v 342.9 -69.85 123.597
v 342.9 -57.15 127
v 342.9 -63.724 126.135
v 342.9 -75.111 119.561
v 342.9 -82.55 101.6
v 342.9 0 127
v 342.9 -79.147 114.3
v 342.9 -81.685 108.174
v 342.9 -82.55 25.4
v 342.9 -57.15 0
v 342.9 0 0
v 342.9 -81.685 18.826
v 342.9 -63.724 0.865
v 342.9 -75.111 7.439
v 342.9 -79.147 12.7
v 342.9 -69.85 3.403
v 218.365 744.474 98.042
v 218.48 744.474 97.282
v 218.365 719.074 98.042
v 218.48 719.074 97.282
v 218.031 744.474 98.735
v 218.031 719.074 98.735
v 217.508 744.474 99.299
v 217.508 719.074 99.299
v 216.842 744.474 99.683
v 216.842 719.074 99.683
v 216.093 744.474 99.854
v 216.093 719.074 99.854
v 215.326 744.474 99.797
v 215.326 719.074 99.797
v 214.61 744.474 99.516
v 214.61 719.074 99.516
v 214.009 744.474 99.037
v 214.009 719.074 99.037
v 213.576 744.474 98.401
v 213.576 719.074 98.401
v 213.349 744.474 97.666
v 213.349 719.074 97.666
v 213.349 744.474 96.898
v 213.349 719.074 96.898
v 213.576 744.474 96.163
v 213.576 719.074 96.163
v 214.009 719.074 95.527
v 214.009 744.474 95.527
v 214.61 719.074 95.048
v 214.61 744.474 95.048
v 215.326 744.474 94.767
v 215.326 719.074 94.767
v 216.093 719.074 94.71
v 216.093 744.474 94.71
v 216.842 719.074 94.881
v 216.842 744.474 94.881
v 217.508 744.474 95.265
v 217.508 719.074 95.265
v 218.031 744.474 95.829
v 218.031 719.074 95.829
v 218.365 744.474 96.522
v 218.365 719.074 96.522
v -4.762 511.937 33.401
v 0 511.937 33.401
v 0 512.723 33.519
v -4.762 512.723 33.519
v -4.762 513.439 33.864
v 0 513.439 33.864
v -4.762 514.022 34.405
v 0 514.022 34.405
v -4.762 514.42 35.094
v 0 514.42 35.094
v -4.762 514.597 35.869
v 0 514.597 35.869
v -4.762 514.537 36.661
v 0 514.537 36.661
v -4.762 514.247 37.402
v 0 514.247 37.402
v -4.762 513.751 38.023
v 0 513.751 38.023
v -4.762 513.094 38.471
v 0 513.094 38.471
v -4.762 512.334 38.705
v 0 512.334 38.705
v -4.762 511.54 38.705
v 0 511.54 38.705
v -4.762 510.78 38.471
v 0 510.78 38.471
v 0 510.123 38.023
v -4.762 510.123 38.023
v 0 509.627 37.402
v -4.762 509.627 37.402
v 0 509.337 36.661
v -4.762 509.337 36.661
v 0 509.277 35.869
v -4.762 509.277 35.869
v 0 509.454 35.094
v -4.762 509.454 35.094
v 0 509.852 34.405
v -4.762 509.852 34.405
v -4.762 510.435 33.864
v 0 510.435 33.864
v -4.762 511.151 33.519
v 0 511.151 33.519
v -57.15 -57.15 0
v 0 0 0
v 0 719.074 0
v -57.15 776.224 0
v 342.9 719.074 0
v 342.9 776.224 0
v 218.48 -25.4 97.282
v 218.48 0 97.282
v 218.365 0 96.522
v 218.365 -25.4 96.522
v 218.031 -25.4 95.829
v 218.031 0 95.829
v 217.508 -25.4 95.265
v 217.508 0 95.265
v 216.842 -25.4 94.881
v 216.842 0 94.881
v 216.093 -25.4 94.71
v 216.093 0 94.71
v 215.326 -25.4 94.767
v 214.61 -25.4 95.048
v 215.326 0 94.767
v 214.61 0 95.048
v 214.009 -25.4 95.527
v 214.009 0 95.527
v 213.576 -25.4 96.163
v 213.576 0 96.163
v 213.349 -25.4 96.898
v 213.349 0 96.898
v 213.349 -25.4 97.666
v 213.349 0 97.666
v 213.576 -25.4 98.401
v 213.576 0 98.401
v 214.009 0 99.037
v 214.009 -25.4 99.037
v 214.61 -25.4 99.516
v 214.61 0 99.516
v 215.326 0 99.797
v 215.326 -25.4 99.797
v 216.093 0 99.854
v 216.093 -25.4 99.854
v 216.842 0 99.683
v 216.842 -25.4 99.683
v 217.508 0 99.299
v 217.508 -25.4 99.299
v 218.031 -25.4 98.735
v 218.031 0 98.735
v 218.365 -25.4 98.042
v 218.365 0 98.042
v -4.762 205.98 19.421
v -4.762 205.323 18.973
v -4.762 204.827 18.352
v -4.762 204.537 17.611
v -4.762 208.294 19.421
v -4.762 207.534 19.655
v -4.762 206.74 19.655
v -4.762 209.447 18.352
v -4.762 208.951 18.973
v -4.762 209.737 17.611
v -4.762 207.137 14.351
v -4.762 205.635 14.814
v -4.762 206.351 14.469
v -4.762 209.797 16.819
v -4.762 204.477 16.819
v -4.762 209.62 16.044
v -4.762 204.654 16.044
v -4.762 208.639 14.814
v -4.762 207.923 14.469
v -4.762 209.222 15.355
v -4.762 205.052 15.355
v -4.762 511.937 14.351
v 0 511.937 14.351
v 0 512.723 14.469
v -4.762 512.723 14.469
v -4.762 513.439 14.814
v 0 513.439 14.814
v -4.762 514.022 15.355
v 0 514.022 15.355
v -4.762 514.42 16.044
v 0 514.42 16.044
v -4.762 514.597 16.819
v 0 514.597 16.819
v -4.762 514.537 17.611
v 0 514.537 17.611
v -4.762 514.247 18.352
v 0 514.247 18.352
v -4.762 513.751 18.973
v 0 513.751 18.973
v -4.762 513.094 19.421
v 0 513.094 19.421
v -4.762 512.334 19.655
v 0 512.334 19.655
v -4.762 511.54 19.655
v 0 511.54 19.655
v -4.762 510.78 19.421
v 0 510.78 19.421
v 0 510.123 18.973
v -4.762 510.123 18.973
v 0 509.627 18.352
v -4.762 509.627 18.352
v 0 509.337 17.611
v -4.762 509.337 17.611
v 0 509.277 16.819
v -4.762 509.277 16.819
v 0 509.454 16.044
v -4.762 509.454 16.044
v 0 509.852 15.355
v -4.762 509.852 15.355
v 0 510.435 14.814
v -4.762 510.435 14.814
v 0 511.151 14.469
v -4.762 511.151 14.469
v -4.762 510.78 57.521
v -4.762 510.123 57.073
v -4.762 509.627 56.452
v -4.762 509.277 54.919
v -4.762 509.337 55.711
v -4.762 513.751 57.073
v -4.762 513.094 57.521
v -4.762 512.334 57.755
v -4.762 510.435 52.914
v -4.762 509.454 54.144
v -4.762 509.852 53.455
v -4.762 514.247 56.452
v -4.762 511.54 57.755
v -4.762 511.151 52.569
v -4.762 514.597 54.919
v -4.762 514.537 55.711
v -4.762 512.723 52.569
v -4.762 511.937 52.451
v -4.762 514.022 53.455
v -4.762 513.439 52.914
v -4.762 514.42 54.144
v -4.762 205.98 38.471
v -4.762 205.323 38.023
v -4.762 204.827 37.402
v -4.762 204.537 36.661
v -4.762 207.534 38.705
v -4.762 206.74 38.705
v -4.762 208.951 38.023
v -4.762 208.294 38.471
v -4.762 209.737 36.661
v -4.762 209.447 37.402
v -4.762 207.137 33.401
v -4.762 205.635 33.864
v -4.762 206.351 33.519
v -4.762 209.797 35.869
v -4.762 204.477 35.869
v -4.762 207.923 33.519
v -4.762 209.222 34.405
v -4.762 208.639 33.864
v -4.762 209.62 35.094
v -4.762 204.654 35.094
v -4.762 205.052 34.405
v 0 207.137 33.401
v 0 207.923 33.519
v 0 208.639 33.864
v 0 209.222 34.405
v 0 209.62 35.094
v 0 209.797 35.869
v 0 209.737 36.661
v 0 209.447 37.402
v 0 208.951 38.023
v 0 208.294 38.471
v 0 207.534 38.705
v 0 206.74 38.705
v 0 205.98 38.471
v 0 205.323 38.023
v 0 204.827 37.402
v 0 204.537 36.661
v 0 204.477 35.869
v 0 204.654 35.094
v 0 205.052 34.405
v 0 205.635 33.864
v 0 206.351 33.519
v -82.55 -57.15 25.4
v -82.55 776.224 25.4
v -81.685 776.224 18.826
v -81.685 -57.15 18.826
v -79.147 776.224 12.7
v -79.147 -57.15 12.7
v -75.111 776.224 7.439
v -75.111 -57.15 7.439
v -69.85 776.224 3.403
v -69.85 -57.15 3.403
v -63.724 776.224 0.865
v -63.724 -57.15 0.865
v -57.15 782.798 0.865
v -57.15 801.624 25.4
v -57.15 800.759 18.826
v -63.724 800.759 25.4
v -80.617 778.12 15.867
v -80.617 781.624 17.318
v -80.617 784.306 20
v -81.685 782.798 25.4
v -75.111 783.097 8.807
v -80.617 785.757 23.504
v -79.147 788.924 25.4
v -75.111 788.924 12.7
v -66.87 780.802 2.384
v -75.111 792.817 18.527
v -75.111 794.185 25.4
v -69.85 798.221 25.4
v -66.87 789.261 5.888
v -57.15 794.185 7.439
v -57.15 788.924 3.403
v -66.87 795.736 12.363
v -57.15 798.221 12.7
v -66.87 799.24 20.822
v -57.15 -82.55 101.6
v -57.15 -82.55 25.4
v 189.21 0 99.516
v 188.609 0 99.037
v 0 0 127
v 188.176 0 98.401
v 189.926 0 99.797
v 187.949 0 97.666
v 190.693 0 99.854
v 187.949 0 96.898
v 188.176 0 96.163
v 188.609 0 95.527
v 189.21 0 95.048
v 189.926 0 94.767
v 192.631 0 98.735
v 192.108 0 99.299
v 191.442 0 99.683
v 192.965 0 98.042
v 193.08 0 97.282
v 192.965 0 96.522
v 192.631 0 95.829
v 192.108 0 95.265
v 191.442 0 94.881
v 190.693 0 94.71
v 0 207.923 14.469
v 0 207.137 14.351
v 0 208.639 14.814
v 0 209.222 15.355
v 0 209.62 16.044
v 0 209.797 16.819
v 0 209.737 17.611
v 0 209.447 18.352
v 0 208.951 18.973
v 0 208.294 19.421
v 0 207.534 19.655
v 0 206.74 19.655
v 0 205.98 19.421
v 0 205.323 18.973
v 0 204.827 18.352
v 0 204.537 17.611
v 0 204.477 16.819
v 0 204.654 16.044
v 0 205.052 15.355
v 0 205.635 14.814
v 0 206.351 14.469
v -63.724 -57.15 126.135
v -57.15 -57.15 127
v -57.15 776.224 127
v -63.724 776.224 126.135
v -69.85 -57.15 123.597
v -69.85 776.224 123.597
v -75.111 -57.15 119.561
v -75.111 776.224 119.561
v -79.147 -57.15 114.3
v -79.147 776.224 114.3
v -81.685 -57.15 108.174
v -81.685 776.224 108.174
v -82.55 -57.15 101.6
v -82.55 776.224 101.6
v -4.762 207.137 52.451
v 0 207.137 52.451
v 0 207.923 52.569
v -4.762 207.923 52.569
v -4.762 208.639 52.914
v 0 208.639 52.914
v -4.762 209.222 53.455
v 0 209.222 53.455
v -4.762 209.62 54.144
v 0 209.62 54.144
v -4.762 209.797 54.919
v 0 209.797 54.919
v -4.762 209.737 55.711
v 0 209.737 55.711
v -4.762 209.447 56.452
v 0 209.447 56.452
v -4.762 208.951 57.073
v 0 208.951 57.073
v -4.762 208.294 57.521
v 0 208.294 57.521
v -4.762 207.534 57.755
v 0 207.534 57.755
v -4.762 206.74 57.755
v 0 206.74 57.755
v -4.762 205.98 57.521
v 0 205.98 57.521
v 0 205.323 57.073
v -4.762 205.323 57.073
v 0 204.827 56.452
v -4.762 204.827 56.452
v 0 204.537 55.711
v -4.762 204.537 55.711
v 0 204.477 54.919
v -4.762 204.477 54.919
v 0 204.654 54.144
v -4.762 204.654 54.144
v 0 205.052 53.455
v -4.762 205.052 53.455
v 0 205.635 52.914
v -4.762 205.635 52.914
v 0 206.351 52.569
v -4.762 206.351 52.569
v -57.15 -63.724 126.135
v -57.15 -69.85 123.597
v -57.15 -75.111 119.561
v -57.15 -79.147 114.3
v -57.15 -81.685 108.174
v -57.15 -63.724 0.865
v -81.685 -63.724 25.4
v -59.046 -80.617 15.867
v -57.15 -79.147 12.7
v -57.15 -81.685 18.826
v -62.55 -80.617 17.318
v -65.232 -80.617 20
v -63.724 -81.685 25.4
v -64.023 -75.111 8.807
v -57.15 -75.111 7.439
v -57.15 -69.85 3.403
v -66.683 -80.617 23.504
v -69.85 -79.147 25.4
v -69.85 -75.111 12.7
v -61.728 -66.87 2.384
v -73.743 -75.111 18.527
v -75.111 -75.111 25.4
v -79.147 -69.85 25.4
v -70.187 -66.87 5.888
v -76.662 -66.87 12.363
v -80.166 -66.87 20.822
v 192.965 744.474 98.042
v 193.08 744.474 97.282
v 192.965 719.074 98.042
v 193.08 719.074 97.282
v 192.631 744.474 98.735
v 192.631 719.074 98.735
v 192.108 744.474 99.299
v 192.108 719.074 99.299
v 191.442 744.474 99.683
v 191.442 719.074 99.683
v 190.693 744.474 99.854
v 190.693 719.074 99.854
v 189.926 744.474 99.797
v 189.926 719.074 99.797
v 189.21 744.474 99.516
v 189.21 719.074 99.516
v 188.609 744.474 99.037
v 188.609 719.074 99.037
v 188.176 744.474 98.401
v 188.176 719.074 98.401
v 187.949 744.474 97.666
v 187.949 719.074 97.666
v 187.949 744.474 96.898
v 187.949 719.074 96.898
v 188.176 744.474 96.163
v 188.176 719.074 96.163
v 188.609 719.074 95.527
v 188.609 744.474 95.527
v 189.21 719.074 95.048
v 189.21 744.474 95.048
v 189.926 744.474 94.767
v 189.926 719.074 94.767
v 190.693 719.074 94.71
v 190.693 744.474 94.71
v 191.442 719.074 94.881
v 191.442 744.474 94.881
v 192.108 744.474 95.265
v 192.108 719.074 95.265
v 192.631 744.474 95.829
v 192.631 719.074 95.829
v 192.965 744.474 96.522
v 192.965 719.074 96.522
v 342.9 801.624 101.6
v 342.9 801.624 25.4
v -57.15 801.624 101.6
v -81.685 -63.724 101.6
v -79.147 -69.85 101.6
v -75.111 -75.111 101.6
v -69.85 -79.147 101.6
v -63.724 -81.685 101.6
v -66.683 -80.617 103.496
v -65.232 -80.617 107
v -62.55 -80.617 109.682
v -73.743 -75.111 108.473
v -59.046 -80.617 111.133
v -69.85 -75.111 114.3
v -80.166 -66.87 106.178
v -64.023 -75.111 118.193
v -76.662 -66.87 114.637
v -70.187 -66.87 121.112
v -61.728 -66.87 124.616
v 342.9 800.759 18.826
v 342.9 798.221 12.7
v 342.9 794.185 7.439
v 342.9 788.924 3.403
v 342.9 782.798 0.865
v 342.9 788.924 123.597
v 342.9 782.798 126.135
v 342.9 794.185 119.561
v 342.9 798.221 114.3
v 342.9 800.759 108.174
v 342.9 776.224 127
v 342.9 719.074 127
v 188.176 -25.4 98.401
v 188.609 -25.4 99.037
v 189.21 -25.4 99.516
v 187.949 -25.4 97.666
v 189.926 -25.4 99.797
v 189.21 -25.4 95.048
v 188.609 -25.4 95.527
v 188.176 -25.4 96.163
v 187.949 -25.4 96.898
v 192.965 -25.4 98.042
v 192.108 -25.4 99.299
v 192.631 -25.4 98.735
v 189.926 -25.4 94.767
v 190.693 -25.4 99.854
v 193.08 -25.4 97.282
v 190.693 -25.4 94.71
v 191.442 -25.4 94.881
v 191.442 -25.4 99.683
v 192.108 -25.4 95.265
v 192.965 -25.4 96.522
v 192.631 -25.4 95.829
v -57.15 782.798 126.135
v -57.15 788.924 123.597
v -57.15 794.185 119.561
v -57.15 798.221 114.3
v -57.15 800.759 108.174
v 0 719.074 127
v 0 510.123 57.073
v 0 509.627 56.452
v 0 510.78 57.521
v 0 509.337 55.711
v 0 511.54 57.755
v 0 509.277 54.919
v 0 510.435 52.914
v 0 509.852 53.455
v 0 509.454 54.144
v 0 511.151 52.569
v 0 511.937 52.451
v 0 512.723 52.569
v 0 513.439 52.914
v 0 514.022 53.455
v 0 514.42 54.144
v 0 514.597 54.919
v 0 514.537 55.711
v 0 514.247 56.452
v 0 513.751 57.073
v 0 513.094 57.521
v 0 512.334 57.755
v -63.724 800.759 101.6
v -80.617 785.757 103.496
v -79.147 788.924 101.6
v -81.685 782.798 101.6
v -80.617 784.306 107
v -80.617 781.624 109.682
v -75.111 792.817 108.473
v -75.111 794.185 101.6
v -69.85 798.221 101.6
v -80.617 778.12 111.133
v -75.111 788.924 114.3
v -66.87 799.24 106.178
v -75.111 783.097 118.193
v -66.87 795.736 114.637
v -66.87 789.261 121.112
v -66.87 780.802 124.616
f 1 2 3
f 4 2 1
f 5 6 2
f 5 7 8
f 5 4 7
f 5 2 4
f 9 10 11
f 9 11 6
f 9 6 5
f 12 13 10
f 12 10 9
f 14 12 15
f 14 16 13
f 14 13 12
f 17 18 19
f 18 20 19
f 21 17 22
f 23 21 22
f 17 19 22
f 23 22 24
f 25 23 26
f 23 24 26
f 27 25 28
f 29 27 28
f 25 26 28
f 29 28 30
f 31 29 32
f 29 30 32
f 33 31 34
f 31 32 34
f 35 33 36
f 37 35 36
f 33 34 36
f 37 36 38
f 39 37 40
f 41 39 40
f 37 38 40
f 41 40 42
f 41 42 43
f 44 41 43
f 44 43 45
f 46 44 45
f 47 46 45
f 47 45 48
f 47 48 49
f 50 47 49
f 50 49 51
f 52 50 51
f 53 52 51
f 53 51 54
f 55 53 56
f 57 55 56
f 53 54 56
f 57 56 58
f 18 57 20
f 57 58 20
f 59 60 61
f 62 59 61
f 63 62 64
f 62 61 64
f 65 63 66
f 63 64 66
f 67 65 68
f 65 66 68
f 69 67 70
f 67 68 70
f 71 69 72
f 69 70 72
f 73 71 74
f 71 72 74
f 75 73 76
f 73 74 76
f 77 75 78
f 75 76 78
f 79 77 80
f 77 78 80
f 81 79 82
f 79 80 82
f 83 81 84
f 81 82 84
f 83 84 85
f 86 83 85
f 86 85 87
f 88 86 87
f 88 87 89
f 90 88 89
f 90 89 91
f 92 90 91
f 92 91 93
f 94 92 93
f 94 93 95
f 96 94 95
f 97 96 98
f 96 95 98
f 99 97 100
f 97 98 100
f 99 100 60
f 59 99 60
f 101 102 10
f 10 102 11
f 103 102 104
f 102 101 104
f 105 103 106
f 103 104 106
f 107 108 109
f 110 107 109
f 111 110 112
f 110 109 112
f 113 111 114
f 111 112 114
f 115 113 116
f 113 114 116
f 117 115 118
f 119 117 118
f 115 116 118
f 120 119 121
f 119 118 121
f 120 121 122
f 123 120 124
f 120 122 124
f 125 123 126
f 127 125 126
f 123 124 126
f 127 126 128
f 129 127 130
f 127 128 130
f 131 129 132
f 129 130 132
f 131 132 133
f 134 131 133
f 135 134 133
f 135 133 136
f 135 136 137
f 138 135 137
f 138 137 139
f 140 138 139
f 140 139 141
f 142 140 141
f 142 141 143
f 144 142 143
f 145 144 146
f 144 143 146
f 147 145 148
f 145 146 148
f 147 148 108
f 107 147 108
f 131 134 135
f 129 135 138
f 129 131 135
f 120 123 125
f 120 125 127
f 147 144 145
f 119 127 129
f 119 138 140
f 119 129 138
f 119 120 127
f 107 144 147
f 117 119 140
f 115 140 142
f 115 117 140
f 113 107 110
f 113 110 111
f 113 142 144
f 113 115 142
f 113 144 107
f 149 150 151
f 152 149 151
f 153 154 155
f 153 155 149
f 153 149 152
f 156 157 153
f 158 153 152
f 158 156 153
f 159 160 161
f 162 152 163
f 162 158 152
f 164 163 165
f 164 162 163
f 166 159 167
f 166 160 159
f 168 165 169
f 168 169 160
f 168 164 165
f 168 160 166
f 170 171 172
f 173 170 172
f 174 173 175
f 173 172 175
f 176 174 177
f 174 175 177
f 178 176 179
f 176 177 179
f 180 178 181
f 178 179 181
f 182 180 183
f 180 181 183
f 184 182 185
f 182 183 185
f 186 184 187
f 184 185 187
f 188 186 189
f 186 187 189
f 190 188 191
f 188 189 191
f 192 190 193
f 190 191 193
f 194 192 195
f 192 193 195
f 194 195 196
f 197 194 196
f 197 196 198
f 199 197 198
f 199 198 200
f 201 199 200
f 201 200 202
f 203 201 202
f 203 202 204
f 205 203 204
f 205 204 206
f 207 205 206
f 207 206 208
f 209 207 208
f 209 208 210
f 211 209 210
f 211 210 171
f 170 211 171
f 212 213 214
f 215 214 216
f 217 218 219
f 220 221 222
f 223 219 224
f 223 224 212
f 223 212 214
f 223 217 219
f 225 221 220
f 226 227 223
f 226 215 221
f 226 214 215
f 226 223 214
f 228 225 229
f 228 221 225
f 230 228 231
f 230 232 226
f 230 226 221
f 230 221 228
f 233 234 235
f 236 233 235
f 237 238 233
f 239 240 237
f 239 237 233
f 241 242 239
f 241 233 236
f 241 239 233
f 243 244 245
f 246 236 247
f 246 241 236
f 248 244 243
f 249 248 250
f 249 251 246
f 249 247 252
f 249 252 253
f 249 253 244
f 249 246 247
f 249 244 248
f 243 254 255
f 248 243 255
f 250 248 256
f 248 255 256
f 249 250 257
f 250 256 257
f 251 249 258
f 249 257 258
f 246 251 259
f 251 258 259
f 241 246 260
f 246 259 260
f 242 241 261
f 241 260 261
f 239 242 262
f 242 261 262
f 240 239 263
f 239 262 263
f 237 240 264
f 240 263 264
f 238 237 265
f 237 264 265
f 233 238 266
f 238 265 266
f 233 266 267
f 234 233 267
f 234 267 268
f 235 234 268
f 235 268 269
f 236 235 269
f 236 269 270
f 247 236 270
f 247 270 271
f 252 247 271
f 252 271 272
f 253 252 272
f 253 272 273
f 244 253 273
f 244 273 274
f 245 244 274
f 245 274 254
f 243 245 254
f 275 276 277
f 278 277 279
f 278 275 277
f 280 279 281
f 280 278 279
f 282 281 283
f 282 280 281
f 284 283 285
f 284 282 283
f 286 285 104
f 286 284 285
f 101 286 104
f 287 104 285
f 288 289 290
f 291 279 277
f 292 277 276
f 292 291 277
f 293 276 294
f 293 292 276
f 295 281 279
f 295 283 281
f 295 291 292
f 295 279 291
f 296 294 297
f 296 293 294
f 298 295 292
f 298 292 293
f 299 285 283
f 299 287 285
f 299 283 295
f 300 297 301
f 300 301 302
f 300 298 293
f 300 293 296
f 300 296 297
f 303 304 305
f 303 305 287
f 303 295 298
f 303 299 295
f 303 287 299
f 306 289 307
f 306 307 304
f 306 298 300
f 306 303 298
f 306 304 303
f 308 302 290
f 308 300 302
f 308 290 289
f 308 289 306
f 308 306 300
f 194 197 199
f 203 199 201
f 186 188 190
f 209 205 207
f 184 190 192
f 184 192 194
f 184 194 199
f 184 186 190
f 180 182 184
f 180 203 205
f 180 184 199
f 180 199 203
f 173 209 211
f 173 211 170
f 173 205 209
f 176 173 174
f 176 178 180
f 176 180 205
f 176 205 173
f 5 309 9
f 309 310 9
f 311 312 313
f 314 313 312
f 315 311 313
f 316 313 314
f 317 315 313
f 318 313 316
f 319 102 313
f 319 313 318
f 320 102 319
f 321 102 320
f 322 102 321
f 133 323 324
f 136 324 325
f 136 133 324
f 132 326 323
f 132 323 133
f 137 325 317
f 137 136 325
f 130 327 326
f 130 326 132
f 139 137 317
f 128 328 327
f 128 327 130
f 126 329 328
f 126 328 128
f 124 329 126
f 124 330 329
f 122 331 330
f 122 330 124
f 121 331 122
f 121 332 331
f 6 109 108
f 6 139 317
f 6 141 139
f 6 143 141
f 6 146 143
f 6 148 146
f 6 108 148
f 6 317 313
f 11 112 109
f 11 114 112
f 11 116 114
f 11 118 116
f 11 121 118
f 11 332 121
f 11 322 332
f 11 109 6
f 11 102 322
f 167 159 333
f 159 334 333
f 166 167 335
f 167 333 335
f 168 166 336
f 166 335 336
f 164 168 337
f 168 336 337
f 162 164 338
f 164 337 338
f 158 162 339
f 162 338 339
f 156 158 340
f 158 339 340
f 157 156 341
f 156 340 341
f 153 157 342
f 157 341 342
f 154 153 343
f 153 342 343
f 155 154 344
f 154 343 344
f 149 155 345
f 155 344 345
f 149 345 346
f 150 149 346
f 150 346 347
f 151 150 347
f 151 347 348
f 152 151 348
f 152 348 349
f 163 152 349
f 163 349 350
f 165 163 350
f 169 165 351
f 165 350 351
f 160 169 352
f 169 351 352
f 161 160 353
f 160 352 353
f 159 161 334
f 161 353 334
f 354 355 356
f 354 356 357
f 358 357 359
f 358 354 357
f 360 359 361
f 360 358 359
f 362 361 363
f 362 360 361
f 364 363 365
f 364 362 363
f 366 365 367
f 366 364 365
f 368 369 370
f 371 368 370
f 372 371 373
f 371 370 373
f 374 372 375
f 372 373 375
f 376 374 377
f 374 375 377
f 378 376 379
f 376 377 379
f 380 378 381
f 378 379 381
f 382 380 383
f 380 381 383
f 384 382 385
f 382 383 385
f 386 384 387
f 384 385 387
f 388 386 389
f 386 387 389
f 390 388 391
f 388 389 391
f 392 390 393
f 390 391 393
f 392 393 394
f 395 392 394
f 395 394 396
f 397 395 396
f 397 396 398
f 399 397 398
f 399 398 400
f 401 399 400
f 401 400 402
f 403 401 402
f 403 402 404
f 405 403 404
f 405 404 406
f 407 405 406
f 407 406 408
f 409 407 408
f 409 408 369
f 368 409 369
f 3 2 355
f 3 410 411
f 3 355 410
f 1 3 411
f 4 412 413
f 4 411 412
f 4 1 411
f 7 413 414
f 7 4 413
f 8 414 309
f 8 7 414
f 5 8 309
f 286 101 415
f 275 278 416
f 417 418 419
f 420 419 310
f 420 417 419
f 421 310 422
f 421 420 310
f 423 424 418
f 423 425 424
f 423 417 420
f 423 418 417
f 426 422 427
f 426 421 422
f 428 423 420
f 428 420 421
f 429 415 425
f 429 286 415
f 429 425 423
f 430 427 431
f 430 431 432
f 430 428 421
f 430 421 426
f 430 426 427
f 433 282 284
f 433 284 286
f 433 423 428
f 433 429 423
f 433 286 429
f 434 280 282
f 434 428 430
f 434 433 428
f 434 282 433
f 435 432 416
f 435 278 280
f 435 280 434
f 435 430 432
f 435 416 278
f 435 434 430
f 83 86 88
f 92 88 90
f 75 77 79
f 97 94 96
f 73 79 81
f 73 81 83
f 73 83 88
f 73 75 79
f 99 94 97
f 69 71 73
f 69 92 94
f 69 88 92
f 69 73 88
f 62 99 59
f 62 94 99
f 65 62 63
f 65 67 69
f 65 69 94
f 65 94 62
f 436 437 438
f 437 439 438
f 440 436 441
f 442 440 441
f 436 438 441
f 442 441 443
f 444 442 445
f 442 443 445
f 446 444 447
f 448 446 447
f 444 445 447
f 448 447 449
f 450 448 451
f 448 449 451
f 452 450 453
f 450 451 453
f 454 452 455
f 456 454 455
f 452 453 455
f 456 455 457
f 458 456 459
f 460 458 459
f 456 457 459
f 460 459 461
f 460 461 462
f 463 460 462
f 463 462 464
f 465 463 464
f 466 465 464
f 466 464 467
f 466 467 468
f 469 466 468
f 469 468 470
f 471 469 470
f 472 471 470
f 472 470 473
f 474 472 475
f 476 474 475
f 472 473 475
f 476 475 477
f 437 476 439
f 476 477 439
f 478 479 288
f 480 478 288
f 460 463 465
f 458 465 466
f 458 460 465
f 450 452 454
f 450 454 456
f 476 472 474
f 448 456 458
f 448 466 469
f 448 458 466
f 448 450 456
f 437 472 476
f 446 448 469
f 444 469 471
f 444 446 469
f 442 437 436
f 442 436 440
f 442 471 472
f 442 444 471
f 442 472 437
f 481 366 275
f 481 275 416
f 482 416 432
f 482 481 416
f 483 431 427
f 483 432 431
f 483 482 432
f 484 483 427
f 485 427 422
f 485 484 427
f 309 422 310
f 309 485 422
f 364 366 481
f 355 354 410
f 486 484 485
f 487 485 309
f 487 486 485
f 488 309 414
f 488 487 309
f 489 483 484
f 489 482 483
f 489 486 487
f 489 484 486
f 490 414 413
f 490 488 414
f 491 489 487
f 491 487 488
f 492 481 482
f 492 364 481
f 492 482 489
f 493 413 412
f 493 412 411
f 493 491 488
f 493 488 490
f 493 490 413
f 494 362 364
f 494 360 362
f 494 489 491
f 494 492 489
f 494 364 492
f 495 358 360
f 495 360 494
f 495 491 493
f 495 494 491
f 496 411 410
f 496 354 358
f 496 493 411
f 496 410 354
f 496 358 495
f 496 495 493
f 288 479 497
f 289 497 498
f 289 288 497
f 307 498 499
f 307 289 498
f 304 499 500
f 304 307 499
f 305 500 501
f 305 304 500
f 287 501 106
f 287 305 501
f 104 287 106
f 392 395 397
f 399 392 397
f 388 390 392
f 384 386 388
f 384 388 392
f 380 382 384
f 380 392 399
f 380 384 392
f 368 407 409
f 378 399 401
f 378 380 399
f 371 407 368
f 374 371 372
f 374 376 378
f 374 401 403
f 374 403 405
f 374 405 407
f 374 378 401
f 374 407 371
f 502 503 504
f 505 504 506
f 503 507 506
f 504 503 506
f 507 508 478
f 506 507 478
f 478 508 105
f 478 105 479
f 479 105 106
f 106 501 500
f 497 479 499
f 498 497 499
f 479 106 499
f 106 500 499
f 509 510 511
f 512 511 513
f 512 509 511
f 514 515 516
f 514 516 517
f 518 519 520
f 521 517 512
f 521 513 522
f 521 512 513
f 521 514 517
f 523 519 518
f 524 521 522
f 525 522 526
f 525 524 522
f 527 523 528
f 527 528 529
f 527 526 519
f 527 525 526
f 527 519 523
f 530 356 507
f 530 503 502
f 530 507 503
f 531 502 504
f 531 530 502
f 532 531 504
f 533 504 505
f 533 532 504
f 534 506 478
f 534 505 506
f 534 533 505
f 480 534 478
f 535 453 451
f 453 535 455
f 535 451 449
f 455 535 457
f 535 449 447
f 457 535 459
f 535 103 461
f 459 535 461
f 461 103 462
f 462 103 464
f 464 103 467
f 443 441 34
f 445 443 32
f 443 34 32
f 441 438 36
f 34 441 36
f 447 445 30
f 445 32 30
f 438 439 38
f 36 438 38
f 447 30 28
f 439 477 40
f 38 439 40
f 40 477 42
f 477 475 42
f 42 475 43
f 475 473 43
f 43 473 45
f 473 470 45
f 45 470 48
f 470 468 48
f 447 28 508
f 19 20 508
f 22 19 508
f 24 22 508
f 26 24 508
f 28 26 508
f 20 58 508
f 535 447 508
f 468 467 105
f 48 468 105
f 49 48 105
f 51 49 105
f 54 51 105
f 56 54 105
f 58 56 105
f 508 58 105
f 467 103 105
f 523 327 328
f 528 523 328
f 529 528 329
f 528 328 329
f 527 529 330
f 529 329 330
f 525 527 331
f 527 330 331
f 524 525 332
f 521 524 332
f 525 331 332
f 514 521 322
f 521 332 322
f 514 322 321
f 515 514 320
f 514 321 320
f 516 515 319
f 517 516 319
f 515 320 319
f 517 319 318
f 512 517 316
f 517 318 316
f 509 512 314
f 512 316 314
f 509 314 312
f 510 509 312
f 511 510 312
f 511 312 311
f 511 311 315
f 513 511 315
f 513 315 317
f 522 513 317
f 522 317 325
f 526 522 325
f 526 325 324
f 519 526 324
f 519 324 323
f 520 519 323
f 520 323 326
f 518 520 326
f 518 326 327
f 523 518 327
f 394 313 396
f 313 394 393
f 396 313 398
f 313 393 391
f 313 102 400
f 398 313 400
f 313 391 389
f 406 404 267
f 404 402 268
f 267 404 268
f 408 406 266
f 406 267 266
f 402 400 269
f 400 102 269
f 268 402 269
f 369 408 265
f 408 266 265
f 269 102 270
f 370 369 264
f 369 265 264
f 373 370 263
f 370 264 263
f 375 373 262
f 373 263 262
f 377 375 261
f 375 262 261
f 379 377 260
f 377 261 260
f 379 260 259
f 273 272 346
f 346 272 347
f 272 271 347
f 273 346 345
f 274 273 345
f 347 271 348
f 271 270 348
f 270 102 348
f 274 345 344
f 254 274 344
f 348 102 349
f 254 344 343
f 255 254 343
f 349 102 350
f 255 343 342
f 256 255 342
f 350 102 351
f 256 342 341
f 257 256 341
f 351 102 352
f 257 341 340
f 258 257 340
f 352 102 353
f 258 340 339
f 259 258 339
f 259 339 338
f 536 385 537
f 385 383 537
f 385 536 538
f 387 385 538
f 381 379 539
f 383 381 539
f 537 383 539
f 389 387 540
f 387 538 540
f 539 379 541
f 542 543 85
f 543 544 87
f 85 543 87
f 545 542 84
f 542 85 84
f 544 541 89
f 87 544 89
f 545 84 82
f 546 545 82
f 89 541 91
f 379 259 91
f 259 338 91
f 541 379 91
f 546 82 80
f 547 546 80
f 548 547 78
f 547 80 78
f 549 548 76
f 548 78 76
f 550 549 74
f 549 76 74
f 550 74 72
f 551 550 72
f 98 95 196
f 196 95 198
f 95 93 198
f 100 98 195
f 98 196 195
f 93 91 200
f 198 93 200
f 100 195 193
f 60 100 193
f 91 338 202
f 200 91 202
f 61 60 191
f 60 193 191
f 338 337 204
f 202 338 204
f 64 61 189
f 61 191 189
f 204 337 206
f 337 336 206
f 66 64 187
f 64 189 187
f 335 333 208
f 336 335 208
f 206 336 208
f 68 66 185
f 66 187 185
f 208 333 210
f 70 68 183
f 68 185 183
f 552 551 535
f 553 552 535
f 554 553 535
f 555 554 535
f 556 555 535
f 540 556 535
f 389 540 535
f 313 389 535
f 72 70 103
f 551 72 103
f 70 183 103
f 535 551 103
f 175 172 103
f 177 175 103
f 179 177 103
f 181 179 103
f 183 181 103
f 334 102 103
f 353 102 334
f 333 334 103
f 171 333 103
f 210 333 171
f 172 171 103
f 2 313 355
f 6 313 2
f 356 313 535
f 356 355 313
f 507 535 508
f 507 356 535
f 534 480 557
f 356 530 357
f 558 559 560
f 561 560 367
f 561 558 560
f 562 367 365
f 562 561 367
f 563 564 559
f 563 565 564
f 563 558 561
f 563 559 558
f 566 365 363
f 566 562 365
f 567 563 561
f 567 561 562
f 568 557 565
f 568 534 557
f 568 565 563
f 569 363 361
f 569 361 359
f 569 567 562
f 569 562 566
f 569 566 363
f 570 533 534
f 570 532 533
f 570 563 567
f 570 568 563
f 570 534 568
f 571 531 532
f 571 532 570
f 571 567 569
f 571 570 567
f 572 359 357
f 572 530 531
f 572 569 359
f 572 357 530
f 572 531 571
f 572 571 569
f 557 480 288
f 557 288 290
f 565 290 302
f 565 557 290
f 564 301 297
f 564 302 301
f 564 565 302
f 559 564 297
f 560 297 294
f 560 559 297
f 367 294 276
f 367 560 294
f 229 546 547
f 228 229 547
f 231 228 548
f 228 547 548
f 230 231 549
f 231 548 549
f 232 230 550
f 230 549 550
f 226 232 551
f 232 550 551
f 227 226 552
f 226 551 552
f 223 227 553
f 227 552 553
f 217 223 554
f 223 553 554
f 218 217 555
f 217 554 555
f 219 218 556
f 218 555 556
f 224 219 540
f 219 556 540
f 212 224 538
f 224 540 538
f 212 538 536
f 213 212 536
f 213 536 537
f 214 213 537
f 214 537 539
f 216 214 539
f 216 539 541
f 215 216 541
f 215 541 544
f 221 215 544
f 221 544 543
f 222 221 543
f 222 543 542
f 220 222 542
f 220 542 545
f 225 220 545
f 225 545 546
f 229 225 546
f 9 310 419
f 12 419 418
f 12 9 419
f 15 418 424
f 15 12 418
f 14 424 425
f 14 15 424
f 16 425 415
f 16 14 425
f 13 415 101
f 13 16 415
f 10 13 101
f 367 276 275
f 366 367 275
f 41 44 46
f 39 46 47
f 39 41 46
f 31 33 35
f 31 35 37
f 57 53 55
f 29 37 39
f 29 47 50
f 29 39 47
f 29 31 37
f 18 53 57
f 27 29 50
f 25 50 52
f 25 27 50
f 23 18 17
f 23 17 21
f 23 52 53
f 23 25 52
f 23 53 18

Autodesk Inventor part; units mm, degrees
ref_plane "YZ Plane" through (0, 0, 0) normal (1, 0, 0) x (0, 1, 0)
ref_plane "XZ Plane" through (0, 0, 0) normal (0, 1, 0) x (-1, 0, 0)
ref_plane "XY Plane" through (0, 0, 0) normal (0, 0, 1) x (1, 0, 0)
sketch "Sketch1" plane through (0, 0, 0) normal (0, 0, 1) x (1, 0, 0)
  line L0 (0, 0) -> (0, 719.074)
  line L1 (0, 719.074) -> (342.9, 719.074)
  line L2 (0, 0) -> (342.9, 0)
  line L3 (342.9, 801.624) -> (-82.55, 801.624)
  line L4 (-82.55, 801.624) -> (-82.55, -82.55)
  line L5 (-82.55, -82.55) -> (342.9, -82.55)
  line L6 (342.9, 719.074) -> (342.9, 801.624)
  line L7 (342.9, 0) -> (342.9, -82.55)
  dimension "d0" = 719.074
  dimension "d1" = 342.9
  dimension "d2" = 82.55
extrude "Extrusion1" add sketch "Sketch1" along normal blind 127
fillet "Fillet1" radius 25.4 8 edges at (130.175, 801.624, 127) (130.175, 801.624, 0) (-82.55, 801.624, 63.5) (-82.55, 359.537, 127) (-82.55, 359.537, 0) (-82.55, -82.55, 63.5) (130.175, -82.55, 0) (130.175, -82.55, 127)
sketch "Sketch2" plane through (0, 719.074, 0) normal (0, -1, 0) x (1, 0, 0)
  line L0 (342.9, 0) -> (342.9, 127) construction
  line L1 (0, 127) -> (342.9, 127) construction
  line L2 (0, 127) -> (190.5, 127) construction
  line L3 (0, 0) -> (342.9, 0) construction
  line L4 (190.5, 0) -> (190.5, 97.282) construction
  line L5 (190.5, 0) -> (287.782, 0) construction
  line L6 (190.5, 97.282) -> (215.9, 97.282) construction
  circle A0 centre (190.5, 97.282) radius 2.5797
  circle A1 centre (215.9, 97.282) radius 2.5797
  dimension "d30" = 190.5
  dimension "d31" = 97.282
  dimension "d32" = 90
  dimension "d33" = 25.4
  dimension "d34" = 5.1594
sketch "Sketch3" plane through (0, 0, 0) normal (0, 1, 0) x (1, 0, 0)
  line L0 (0, 0) -> (0, -127) construction
  line L1 (0, -127) -> (190.5, -127) construction
  line L2 (342.9, -127) -> (0, -127) construction
  line L3 (190.5, -127) -> (190.5, -97.282) construction
  line L4 (190.5, -127) -> (220.218, -127) construction
  line L5 (190.5, -97.282) -> (215.9, -97.282) construction
  line L6 (190.5, -97.282) -> (215.9, -97.282) construction
  circle A0 centre (190.5, -97.282) radius 2.5797
  circle A1 centre (215.9, -97.282) radius 2.5797
  dimension "d37" = 190.5
  dimension "d38" = 29.718
  dimension "d39" = 90
  dimension "d40" = 25.4
  dimension "d41" = 0
  dimension "d42" = 5.1594
sketch "Sketch4" plane through (0, 0, 0) normal (1, 0, 0) x (0, 0, -1)
  line L0 (-127, -57.15) -> (-127, 0) construction
  line L1 (-127, 0) -> (-127, 207.137) construction
  line L2 (-127, 0) -> (-127, 719.074) construction
  line L3 (-127, 207.137) -> (-55.118, 207.137) construction
  line L4 (-55.118, 207.137) -> (-36.068, 207.137) construction
  line L5 (-36.068, 207.137) -> (-17.018, 207.137) construction
  circle A0 centre (-55.118, 207.137) radius 2.667
  circle A1 centre (-36.068, 207.137) radius 2.667
  circle A2 centre (-17.018, 207.137) radius 2.667
  line L6 (-127, 359.537) -> (0, 359.537) construction
  line L7 (0, 0) -> (0, 719.074) construction
  line L8 (-55.118, 511.937) -> (-36.068, 511.937) construction
  line L9 (-36.068, 511.937) -> (-17.018, 511.937) construction
  circle A3 centre (-55.118, 511.937) radius 2.667
  circle A4 centre (-36.068, 511.937) radius 2.667
  circle A5 centre (-17.018, 511.937) radius 2.667
  dimension "d23" = 207.137
  dimension "d24" = 71.882
  dimension "d25" = 19.05
  dimension "d26" = 19.05
  dimension "d27" = 5.334
extrude "Extrusion4" cut sketch "Sketch4" against normal blind 4.7625
extrude "Extrusion5" cut sketch "Sketch2" against normal blind 25.4
extrude "Extrusion6" cut sketch "Sketch3" against normal blind 25.4
properties part number "Bumper Side V2"
